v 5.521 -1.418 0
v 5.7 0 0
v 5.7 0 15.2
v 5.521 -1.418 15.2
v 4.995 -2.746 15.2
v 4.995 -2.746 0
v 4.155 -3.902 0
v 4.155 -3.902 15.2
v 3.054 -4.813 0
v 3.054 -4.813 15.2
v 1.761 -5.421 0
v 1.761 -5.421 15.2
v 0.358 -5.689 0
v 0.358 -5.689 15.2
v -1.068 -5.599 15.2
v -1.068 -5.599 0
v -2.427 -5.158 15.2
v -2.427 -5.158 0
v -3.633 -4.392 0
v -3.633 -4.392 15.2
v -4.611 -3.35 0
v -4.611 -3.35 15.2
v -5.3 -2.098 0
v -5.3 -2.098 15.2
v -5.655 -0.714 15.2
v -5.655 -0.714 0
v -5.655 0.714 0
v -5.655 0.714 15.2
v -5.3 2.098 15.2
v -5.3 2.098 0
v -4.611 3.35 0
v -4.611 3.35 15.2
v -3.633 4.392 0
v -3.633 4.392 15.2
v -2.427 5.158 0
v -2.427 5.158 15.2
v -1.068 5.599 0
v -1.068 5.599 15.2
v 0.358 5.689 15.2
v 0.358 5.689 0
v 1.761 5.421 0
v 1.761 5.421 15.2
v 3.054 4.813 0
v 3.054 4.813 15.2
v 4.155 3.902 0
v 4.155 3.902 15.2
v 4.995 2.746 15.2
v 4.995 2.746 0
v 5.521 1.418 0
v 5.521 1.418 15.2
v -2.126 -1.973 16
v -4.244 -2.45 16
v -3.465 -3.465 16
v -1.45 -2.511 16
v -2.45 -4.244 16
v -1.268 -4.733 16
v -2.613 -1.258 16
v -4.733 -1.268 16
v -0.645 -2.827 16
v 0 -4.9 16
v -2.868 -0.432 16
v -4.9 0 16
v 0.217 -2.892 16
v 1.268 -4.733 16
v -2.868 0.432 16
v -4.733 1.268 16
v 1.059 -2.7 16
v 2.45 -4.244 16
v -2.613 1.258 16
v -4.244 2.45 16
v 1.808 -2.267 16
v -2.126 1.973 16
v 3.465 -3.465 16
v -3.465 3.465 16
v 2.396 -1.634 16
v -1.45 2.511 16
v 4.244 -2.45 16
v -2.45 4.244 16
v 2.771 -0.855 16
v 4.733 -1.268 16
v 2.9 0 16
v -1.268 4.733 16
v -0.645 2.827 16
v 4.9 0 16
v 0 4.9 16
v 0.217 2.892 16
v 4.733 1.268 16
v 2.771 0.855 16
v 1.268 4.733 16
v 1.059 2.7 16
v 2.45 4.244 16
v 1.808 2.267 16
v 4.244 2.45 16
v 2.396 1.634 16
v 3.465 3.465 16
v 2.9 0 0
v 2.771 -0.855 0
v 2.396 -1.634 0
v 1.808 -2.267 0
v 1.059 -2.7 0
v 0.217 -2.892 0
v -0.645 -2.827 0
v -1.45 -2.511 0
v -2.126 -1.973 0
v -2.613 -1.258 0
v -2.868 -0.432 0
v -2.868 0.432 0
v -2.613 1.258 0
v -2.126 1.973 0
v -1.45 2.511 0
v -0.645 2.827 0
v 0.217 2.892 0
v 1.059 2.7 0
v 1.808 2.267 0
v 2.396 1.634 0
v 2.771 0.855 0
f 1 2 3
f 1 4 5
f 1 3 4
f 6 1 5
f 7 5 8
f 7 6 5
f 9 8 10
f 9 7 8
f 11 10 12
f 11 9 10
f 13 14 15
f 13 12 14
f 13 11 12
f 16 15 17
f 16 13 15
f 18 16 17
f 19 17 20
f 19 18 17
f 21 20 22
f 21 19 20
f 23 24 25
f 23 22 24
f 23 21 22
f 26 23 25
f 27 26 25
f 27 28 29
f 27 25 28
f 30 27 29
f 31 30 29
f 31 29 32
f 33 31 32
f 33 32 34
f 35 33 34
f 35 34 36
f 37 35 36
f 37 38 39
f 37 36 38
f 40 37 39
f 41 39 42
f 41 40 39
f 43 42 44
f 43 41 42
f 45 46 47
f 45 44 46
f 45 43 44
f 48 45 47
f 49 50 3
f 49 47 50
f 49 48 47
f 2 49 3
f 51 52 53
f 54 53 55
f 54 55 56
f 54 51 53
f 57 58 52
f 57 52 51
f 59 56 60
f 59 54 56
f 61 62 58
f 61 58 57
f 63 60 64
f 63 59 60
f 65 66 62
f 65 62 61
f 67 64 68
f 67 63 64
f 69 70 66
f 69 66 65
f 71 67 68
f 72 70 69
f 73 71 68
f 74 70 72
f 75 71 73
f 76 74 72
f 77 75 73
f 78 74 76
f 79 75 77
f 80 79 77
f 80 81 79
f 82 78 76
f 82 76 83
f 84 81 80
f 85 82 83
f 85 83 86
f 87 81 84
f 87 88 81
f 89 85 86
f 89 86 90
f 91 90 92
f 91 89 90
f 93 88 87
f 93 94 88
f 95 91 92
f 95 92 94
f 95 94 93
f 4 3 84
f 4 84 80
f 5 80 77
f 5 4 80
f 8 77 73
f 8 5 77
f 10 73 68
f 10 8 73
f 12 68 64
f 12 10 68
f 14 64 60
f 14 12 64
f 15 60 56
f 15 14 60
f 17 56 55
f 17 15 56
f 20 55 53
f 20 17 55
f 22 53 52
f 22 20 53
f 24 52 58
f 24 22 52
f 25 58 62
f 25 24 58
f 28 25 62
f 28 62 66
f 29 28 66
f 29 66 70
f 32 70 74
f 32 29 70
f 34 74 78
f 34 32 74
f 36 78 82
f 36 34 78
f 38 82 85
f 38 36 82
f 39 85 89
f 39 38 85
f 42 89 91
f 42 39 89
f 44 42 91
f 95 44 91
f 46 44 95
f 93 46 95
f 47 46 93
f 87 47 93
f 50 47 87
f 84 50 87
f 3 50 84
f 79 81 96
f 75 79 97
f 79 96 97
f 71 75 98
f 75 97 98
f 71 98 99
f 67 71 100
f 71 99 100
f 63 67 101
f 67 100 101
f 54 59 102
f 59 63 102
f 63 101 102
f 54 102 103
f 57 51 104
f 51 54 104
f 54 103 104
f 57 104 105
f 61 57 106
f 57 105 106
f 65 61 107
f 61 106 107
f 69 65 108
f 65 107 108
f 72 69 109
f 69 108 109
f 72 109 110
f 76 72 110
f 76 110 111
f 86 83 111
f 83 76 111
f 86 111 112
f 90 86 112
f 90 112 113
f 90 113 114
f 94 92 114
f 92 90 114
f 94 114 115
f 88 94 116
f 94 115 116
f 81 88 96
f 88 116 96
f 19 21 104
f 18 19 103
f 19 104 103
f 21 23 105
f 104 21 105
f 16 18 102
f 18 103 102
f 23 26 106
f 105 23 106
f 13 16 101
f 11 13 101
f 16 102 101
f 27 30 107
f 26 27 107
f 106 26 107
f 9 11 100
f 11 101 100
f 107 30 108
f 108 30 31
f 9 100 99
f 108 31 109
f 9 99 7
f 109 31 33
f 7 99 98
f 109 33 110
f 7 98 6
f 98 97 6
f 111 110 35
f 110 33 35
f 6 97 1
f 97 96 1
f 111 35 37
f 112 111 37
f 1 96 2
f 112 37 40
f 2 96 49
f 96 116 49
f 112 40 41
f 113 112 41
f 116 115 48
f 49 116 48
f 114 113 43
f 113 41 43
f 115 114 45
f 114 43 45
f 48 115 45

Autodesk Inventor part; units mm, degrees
ref_plane "YZ Plane" through (0, 0, 0) normal (1, 0, 0) x (0, 1, 0)
ref_plane "XZ Plane" through (0, 0, 0) normal (0, 1, 0) x (-1, 0, 0)
ref_plane "XY Plane" through (0, 0, 0) normal (0, 0, 1) x (1, 0, 0)
sketch "Sketch1" plane through (0, 0, 0) normal (0, 0, 1) x (1, 0, 0)
  circle A0 centre (0, 0) radius 5.7
  dimension "d0" = 11.4
extrude "Extrusion1" add sketch "Sketch1" along normal blind 16
chamfer "Chamfer1" distance 0.8 angle 45 1 edges at (-5.7, 0, 16)
sketch "Sketch2" plane through (0, 0, 0) normal (0, 0, 1) x (1, 0, 0)
  circle A0 centre (0, 0) radius 2.9
  dimension "d6" = 5.8
extrude "Extrusion2" cut sketch "Sketch2" along normal up to surface (16 mm away)
properties part number "Insert16mm"
